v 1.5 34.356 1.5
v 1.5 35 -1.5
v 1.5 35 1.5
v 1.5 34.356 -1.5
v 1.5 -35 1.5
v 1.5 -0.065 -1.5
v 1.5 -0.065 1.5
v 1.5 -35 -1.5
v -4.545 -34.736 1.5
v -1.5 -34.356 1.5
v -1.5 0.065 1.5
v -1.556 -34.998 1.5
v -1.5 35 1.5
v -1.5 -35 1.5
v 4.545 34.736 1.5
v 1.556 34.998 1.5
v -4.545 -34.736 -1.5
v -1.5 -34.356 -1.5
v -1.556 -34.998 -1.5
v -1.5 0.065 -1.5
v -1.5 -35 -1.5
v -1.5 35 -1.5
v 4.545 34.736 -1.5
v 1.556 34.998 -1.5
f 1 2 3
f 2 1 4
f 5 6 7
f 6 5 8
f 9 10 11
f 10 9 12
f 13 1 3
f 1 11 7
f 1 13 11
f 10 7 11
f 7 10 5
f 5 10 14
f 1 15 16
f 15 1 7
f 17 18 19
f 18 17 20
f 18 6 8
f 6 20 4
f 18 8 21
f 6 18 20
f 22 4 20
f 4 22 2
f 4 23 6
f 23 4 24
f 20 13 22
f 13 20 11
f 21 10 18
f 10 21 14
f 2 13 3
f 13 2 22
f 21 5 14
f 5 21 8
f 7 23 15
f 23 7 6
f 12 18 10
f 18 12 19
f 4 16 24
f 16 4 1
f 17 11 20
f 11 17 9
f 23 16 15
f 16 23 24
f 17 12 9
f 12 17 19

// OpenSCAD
$fn=128;
//    import("24_Inch_Radius_-_W.stl");

// track radius
rd=618;
// track width
tw=70;
// outer rim
or=rd+tw/2;
// inner rim
ir=rd-tw/2;
// angle per segment
ag=5;

//polygon([[0,ir],[0,or],[sin(ag)*or,cos(ag)*(or)], [sin(ag)*ir,cos(ag)*(ir)]]);



cube([3,tw,3],true);
rotate([0,0,-ag]) cube([3,tw,3],true);

//translate([sin(ag)*ir,0,0]) rotate([0,0,-ag]) cube([3,tw,3]);
//translate([0,tw,0]) rotate([0,0,-90-ag]) cube([3,tw,3]);



 
